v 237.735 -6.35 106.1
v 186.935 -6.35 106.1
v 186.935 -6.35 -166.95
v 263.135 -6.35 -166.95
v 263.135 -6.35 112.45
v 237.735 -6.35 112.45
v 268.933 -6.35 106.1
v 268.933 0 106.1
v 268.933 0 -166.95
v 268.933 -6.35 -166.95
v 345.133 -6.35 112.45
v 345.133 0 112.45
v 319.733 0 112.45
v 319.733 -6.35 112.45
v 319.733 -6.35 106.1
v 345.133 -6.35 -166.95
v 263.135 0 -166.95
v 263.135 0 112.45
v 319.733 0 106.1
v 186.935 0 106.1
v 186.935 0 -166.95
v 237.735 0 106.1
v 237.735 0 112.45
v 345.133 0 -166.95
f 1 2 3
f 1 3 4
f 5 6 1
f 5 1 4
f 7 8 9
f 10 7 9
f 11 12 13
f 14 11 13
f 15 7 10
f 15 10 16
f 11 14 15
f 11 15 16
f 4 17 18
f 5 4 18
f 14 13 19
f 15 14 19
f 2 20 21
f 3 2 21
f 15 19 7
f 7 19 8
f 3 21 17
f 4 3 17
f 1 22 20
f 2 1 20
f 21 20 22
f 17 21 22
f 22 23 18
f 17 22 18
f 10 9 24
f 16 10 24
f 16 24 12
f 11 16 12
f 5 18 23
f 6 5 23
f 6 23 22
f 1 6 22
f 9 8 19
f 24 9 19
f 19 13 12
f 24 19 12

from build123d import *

# Parameters (mm, degrees)
F1_DEPTH = 6.35


# Not quite as in the source:
# - a feature names something its author has since deleted; it is built from what else it names


with BuildPart() as f1:
    # F0 (on Front) → F1 (new body)
    with BuildSketch(Plane.XZ):
        Polygon((345.1327616, -166.950009), (345.1327616, 106.099991), (345.1327616, 112.449991), (319.7327616, 112.449991), (319.7327616, 106.099991), (268.9327616, 106.099991), (268.9327616, -166.950009), align=None)
    extrude(amount=F1_DEPTH)


with BuildPart() as f1b:
    # F0 (on Front) → F1, piece 2 (new body)
    with BuildSketch(Plane.XZ):
        Polygon((263.1353386, -166.950009), (263.1353386, 106.099991), (263.1353386, 112.449991), (237.7353386, 112.449991), (237.7353386, 106.099991), (186.9353386, 106.099991), (186.9353386, -166.950009), align=None)
    extrude(amount=F1_DEPTH)


solid = Compound([f1.part, f1b.part])
